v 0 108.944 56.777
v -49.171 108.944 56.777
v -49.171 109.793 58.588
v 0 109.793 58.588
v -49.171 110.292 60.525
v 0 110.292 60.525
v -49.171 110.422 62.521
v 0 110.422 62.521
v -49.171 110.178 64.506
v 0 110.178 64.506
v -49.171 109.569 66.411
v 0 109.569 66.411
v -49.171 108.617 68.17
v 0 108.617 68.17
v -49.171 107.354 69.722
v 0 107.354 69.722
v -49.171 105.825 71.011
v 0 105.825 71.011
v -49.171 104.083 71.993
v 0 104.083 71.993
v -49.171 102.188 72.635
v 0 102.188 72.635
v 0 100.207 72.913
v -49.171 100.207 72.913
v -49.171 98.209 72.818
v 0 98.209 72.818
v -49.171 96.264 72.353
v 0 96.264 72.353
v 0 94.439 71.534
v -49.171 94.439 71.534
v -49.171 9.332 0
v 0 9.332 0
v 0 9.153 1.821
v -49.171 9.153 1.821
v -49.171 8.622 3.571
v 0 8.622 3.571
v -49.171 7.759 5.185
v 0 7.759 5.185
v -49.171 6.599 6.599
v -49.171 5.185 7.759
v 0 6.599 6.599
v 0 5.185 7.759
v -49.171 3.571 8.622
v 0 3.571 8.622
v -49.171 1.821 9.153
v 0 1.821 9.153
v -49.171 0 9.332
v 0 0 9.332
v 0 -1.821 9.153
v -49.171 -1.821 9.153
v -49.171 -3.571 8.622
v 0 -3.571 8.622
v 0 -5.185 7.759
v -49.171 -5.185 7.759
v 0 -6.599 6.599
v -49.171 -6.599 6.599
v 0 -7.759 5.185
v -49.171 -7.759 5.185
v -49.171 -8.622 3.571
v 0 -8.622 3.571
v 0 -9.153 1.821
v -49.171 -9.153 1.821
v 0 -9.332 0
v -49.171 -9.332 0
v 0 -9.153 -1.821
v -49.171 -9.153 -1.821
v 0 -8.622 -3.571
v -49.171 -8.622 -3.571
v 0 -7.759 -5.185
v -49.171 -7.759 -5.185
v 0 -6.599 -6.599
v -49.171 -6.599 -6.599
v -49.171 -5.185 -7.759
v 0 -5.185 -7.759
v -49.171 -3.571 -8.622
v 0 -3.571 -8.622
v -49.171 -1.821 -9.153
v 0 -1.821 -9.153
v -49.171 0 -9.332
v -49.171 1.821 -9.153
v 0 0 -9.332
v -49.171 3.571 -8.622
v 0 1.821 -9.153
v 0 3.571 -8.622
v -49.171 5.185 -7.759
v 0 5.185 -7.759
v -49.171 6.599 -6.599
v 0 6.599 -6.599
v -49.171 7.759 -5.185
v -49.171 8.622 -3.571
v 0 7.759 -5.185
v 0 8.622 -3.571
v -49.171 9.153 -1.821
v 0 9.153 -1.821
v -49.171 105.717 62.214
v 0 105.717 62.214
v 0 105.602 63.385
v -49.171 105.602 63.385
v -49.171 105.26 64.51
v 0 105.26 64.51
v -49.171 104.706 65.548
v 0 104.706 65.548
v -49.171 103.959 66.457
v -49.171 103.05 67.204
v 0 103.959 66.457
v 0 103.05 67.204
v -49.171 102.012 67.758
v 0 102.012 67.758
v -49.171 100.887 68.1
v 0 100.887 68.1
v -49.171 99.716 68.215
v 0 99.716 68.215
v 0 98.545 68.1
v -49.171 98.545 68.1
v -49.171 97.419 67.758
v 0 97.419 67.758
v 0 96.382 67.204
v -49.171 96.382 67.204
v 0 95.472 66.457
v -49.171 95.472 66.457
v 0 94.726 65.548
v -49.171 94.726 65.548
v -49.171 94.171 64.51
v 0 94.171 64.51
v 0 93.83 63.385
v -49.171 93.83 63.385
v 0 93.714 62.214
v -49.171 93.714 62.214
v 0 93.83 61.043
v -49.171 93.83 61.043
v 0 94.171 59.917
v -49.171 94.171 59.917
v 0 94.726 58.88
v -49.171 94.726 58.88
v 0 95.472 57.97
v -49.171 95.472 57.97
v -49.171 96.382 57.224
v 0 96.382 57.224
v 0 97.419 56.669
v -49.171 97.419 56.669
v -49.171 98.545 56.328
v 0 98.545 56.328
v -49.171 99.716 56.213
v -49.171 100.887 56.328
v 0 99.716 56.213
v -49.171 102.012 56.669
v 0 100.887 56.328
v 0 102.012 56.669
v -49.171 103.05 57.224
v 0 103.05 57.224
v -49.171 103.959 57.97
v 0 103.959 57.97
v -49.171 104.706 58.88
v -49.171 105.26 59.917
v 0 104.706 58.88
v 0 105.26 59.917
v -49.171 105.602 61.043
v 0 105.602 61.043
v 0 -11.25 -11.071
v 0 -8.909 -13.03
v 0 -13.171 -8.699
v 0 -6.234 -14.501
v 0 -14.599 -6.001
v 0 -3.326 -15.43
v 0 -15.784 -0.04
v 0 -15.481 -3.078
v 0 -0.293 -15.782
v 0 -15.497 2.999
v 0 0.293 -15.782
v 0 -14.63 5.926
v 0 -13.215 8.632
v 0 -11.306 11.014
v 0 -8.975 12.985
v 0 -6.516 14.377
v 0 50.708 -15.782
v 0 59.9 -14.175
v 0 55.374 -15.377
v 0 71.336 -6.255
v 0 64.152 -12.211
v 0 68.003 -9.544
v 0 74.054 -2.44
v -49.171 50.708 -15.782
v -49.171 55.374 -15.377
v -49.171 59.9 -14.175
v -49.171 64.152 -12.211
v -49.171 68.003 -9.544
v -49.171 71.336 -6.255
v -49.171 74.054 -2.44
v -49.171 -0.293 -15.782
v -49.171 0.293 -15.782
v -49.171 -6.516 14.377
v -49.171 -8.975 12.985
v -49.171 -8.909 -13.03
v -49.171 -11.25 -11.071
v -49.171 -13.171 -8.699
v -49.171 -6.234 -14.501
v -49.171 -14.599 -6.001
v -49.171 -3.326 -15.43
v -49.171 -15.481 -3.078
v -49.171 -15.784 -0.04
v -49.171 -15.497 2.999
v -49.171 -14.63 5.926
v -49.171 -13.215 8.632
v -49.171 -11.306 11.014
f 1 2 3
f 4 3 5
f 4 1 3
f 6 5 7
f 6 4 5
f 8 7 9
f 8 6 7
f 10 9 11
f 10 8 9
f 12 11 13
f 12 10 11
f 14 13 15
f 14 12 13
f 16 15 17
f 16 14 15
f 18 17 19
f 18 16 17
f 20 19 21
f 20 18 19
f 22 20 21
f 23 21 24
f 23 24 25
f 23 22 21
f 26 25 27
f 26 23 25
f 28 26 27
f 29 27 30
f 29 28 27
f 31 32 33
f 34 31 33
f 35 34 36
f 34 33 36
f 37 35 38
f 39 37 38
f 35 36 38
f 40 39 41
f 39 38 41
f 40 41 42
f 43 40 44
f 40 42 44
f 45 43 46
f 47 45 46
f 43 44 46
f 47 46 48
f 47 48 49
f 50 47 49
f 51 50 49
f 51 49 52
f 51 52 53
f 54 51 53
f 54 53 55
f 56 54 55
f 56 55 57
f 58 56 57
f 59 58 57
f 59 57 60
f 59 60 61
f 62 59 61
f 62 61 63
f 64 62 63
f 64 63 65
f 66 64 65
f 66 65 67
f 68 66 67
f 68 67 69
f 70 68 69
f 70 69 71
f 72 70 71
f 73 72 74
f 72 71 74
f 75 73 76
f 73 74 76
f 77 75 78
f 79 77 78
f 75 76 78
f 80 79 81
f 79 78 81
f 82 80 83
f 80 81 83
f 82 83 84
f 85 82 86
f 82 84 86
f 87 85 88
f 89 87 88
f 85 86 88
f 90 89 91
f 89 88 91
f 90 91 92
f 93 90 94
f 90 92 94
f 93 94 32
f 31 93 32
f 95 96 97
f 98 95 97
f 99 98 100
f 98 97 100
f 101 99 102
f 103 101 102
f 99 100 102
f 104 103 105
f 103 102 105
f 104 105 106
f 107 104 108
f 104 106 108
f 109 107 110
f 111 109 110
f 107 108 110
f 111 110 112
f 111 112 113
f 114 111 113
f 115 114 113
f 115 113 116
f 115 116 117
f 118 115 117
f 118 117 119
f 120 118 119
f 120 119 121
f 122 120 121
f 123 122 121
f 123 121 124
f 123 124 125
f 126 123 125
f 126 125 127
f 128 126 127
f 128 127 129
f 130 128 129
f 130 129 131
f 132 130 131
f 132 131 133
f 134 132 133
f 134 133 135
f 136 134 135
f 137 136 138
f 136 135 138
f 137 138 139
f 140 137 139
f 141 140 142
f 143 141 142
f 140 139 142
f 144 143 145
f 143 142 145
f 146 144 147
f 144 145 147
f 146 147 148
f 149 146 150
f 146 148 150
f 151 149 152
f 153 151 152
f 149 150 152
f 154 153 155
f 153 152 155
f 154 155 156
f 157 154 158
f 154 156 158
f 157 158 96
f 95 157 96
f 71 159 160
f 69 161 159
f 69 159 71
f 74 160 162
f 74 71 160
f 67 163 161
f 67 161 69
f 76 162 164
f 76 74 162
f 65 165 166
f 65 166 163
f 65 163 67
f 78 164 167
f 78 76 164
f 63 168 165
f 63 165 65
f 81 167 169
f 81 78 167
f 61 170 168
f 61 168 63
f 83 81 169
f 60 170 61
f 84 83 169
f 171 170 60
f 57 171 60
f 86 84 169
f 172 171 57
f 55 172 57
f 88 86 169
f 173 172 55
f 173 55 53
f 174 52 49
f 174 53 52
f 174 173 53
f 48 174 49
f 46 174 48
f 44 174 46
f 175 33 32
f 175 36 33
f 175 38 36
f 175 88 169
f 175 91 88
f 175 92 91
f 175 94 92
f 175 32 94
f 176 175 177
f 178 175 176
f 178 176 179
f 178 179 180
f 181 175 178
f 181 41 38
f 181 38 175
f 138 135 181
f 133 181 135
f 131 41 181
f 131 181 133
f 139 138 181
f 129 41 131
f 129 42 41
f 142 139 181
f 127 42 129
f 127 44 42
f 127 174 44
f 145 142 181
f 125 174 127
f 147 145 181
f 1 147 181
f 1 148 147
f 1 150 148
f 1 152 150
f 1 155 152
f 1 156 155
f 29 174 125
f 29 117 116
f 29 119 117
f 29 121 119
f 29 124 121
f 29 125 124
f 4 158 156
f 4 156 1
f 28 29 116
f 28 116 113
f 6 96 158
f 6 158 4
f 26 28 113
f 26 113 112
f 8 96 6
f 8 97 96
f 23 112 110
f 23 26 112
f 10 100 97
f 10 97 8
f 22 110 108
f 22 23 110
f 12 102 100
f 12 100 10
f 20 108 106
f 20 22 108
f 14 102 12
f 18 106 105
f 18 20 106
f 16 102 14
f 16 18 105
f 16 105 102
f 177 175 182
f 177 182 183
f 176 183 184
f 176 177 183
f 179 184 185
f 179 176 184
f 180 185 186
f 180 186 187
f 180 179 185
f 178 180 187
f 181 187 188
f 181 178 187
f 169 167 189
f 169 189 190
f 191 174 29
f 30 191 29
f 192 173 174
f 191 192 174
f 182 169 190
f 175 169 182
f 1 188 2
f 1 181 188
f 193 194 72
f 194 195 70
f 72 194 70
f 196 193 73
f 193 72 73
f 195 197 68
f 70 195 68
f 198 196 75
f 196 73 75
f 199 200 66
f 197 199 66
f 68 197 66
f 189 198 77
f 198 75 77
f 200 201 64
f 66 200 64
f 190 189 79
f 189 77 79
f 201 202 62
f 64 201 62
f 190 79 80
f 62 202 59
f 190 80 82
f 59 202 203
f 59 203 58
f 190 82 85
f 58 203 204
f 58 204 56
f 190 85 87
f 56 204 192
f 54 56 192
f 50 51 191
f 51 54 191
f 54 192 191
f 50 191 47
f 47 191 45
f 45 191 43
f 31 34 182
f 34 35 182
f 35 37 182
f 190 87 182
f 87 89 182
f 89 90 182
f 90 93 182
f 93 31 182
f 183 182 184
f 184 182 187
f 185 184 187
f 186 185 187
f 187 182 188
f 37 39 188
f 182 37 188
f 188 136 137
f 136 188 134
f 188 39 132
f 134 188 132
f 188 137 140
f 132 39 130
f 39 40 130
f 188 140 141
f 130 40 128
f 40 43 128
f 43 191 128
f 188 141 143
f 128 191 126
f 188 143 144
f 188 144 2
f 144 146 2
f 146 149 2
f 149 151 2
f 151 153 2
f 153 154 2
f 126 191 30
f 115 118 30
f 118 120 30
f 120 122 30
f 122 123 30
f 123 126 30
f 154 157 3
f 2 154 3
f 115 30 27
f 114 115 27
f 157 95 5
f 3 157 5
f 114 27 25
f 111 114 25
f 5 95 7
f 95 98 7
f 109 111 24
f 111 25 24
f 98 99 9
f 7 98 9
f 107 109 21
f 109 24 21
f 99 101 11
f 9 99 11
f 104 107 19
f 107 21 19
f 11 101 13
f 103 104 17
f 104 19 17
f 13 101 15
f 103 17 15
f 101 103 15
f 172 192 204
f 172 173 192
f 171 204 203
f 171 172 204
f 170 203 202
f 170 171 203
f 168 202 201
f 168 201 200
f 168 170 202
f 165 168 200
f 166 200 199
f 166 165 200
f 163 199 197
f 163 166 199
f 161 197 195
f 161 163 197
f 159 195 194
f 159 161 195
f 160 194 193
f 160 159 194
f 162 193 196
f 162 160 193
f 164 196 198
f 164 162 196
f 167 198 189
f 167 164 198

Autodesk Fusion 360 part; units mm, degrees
sketch "Sketch1" plane through (0, 0, 0) normal (1, 0, 0) x (0, 1, 0)
  circle A0 centre (0, 0) radius 9.332
  line L0 (-0.293, -15.7817) -> (50.7077, -15.7817)
  line L1 (74.0537, -2.44) -> (108.9435, 56.7771)
  line L2 (-8.9747, 12.9847) -> (94.4391, 71.534)
  arc A1 (50.7077, -15.7817) -> (74.0537, -2.44) centre (50.7077, 11.3152) ccw
  arc A2 (-6.5163, 14.3766) -> (0.293, -15.7817) centre (0, 0) ccw
  arc A3 (108.9435, 56.7771) -> (94.4391, 71.534) centre (99.7158, 62.2139) ccw
  circle A4 centre (99.7158, 62.2139) radius 6.0013
  dimension "d1" = 27.0969
  dimension "d3" = 15.7844
  dimension "d4" = 18.6641
  dimension "d5" = 12.0025
  dimension "d6" = 10.7102
  dimension "d7" = 59.494
  dimension "d8" = 29.517
  dimension "d12" = 77.9956
  dimension "d13" = 99.7158
  dimension "d16" = 118.8379
sketch "Sketch3" plane through (0, 0, 0) normal (1, 0, 0) x (0, 1, 0)
  line L0 (81.0105, 50.2421) -> (22.4827, 17.1057)
  line L1 (22.4827, 17.1057) -> (22.4827, -4.1678)
  line L2 (22.4827, -4.1678) -> (34.4677, -4.1678)
  line L3 (71.7994, 17.1664) -> (88.731, 45.9038)
  line L4 (88.731, 45.9038) -> (81.0105, 50.2421)
  arc A0 (34.4677, -4.1678) -> (71.7994, 17.1664) centre (34.4677, 39.1617) ccw
  dimension "d17" = 43.3295
extrude "Extrude1" add sketch "Sketch1" against normal blind 49.171 contours L0 L1 L2 A1 A2 A3
